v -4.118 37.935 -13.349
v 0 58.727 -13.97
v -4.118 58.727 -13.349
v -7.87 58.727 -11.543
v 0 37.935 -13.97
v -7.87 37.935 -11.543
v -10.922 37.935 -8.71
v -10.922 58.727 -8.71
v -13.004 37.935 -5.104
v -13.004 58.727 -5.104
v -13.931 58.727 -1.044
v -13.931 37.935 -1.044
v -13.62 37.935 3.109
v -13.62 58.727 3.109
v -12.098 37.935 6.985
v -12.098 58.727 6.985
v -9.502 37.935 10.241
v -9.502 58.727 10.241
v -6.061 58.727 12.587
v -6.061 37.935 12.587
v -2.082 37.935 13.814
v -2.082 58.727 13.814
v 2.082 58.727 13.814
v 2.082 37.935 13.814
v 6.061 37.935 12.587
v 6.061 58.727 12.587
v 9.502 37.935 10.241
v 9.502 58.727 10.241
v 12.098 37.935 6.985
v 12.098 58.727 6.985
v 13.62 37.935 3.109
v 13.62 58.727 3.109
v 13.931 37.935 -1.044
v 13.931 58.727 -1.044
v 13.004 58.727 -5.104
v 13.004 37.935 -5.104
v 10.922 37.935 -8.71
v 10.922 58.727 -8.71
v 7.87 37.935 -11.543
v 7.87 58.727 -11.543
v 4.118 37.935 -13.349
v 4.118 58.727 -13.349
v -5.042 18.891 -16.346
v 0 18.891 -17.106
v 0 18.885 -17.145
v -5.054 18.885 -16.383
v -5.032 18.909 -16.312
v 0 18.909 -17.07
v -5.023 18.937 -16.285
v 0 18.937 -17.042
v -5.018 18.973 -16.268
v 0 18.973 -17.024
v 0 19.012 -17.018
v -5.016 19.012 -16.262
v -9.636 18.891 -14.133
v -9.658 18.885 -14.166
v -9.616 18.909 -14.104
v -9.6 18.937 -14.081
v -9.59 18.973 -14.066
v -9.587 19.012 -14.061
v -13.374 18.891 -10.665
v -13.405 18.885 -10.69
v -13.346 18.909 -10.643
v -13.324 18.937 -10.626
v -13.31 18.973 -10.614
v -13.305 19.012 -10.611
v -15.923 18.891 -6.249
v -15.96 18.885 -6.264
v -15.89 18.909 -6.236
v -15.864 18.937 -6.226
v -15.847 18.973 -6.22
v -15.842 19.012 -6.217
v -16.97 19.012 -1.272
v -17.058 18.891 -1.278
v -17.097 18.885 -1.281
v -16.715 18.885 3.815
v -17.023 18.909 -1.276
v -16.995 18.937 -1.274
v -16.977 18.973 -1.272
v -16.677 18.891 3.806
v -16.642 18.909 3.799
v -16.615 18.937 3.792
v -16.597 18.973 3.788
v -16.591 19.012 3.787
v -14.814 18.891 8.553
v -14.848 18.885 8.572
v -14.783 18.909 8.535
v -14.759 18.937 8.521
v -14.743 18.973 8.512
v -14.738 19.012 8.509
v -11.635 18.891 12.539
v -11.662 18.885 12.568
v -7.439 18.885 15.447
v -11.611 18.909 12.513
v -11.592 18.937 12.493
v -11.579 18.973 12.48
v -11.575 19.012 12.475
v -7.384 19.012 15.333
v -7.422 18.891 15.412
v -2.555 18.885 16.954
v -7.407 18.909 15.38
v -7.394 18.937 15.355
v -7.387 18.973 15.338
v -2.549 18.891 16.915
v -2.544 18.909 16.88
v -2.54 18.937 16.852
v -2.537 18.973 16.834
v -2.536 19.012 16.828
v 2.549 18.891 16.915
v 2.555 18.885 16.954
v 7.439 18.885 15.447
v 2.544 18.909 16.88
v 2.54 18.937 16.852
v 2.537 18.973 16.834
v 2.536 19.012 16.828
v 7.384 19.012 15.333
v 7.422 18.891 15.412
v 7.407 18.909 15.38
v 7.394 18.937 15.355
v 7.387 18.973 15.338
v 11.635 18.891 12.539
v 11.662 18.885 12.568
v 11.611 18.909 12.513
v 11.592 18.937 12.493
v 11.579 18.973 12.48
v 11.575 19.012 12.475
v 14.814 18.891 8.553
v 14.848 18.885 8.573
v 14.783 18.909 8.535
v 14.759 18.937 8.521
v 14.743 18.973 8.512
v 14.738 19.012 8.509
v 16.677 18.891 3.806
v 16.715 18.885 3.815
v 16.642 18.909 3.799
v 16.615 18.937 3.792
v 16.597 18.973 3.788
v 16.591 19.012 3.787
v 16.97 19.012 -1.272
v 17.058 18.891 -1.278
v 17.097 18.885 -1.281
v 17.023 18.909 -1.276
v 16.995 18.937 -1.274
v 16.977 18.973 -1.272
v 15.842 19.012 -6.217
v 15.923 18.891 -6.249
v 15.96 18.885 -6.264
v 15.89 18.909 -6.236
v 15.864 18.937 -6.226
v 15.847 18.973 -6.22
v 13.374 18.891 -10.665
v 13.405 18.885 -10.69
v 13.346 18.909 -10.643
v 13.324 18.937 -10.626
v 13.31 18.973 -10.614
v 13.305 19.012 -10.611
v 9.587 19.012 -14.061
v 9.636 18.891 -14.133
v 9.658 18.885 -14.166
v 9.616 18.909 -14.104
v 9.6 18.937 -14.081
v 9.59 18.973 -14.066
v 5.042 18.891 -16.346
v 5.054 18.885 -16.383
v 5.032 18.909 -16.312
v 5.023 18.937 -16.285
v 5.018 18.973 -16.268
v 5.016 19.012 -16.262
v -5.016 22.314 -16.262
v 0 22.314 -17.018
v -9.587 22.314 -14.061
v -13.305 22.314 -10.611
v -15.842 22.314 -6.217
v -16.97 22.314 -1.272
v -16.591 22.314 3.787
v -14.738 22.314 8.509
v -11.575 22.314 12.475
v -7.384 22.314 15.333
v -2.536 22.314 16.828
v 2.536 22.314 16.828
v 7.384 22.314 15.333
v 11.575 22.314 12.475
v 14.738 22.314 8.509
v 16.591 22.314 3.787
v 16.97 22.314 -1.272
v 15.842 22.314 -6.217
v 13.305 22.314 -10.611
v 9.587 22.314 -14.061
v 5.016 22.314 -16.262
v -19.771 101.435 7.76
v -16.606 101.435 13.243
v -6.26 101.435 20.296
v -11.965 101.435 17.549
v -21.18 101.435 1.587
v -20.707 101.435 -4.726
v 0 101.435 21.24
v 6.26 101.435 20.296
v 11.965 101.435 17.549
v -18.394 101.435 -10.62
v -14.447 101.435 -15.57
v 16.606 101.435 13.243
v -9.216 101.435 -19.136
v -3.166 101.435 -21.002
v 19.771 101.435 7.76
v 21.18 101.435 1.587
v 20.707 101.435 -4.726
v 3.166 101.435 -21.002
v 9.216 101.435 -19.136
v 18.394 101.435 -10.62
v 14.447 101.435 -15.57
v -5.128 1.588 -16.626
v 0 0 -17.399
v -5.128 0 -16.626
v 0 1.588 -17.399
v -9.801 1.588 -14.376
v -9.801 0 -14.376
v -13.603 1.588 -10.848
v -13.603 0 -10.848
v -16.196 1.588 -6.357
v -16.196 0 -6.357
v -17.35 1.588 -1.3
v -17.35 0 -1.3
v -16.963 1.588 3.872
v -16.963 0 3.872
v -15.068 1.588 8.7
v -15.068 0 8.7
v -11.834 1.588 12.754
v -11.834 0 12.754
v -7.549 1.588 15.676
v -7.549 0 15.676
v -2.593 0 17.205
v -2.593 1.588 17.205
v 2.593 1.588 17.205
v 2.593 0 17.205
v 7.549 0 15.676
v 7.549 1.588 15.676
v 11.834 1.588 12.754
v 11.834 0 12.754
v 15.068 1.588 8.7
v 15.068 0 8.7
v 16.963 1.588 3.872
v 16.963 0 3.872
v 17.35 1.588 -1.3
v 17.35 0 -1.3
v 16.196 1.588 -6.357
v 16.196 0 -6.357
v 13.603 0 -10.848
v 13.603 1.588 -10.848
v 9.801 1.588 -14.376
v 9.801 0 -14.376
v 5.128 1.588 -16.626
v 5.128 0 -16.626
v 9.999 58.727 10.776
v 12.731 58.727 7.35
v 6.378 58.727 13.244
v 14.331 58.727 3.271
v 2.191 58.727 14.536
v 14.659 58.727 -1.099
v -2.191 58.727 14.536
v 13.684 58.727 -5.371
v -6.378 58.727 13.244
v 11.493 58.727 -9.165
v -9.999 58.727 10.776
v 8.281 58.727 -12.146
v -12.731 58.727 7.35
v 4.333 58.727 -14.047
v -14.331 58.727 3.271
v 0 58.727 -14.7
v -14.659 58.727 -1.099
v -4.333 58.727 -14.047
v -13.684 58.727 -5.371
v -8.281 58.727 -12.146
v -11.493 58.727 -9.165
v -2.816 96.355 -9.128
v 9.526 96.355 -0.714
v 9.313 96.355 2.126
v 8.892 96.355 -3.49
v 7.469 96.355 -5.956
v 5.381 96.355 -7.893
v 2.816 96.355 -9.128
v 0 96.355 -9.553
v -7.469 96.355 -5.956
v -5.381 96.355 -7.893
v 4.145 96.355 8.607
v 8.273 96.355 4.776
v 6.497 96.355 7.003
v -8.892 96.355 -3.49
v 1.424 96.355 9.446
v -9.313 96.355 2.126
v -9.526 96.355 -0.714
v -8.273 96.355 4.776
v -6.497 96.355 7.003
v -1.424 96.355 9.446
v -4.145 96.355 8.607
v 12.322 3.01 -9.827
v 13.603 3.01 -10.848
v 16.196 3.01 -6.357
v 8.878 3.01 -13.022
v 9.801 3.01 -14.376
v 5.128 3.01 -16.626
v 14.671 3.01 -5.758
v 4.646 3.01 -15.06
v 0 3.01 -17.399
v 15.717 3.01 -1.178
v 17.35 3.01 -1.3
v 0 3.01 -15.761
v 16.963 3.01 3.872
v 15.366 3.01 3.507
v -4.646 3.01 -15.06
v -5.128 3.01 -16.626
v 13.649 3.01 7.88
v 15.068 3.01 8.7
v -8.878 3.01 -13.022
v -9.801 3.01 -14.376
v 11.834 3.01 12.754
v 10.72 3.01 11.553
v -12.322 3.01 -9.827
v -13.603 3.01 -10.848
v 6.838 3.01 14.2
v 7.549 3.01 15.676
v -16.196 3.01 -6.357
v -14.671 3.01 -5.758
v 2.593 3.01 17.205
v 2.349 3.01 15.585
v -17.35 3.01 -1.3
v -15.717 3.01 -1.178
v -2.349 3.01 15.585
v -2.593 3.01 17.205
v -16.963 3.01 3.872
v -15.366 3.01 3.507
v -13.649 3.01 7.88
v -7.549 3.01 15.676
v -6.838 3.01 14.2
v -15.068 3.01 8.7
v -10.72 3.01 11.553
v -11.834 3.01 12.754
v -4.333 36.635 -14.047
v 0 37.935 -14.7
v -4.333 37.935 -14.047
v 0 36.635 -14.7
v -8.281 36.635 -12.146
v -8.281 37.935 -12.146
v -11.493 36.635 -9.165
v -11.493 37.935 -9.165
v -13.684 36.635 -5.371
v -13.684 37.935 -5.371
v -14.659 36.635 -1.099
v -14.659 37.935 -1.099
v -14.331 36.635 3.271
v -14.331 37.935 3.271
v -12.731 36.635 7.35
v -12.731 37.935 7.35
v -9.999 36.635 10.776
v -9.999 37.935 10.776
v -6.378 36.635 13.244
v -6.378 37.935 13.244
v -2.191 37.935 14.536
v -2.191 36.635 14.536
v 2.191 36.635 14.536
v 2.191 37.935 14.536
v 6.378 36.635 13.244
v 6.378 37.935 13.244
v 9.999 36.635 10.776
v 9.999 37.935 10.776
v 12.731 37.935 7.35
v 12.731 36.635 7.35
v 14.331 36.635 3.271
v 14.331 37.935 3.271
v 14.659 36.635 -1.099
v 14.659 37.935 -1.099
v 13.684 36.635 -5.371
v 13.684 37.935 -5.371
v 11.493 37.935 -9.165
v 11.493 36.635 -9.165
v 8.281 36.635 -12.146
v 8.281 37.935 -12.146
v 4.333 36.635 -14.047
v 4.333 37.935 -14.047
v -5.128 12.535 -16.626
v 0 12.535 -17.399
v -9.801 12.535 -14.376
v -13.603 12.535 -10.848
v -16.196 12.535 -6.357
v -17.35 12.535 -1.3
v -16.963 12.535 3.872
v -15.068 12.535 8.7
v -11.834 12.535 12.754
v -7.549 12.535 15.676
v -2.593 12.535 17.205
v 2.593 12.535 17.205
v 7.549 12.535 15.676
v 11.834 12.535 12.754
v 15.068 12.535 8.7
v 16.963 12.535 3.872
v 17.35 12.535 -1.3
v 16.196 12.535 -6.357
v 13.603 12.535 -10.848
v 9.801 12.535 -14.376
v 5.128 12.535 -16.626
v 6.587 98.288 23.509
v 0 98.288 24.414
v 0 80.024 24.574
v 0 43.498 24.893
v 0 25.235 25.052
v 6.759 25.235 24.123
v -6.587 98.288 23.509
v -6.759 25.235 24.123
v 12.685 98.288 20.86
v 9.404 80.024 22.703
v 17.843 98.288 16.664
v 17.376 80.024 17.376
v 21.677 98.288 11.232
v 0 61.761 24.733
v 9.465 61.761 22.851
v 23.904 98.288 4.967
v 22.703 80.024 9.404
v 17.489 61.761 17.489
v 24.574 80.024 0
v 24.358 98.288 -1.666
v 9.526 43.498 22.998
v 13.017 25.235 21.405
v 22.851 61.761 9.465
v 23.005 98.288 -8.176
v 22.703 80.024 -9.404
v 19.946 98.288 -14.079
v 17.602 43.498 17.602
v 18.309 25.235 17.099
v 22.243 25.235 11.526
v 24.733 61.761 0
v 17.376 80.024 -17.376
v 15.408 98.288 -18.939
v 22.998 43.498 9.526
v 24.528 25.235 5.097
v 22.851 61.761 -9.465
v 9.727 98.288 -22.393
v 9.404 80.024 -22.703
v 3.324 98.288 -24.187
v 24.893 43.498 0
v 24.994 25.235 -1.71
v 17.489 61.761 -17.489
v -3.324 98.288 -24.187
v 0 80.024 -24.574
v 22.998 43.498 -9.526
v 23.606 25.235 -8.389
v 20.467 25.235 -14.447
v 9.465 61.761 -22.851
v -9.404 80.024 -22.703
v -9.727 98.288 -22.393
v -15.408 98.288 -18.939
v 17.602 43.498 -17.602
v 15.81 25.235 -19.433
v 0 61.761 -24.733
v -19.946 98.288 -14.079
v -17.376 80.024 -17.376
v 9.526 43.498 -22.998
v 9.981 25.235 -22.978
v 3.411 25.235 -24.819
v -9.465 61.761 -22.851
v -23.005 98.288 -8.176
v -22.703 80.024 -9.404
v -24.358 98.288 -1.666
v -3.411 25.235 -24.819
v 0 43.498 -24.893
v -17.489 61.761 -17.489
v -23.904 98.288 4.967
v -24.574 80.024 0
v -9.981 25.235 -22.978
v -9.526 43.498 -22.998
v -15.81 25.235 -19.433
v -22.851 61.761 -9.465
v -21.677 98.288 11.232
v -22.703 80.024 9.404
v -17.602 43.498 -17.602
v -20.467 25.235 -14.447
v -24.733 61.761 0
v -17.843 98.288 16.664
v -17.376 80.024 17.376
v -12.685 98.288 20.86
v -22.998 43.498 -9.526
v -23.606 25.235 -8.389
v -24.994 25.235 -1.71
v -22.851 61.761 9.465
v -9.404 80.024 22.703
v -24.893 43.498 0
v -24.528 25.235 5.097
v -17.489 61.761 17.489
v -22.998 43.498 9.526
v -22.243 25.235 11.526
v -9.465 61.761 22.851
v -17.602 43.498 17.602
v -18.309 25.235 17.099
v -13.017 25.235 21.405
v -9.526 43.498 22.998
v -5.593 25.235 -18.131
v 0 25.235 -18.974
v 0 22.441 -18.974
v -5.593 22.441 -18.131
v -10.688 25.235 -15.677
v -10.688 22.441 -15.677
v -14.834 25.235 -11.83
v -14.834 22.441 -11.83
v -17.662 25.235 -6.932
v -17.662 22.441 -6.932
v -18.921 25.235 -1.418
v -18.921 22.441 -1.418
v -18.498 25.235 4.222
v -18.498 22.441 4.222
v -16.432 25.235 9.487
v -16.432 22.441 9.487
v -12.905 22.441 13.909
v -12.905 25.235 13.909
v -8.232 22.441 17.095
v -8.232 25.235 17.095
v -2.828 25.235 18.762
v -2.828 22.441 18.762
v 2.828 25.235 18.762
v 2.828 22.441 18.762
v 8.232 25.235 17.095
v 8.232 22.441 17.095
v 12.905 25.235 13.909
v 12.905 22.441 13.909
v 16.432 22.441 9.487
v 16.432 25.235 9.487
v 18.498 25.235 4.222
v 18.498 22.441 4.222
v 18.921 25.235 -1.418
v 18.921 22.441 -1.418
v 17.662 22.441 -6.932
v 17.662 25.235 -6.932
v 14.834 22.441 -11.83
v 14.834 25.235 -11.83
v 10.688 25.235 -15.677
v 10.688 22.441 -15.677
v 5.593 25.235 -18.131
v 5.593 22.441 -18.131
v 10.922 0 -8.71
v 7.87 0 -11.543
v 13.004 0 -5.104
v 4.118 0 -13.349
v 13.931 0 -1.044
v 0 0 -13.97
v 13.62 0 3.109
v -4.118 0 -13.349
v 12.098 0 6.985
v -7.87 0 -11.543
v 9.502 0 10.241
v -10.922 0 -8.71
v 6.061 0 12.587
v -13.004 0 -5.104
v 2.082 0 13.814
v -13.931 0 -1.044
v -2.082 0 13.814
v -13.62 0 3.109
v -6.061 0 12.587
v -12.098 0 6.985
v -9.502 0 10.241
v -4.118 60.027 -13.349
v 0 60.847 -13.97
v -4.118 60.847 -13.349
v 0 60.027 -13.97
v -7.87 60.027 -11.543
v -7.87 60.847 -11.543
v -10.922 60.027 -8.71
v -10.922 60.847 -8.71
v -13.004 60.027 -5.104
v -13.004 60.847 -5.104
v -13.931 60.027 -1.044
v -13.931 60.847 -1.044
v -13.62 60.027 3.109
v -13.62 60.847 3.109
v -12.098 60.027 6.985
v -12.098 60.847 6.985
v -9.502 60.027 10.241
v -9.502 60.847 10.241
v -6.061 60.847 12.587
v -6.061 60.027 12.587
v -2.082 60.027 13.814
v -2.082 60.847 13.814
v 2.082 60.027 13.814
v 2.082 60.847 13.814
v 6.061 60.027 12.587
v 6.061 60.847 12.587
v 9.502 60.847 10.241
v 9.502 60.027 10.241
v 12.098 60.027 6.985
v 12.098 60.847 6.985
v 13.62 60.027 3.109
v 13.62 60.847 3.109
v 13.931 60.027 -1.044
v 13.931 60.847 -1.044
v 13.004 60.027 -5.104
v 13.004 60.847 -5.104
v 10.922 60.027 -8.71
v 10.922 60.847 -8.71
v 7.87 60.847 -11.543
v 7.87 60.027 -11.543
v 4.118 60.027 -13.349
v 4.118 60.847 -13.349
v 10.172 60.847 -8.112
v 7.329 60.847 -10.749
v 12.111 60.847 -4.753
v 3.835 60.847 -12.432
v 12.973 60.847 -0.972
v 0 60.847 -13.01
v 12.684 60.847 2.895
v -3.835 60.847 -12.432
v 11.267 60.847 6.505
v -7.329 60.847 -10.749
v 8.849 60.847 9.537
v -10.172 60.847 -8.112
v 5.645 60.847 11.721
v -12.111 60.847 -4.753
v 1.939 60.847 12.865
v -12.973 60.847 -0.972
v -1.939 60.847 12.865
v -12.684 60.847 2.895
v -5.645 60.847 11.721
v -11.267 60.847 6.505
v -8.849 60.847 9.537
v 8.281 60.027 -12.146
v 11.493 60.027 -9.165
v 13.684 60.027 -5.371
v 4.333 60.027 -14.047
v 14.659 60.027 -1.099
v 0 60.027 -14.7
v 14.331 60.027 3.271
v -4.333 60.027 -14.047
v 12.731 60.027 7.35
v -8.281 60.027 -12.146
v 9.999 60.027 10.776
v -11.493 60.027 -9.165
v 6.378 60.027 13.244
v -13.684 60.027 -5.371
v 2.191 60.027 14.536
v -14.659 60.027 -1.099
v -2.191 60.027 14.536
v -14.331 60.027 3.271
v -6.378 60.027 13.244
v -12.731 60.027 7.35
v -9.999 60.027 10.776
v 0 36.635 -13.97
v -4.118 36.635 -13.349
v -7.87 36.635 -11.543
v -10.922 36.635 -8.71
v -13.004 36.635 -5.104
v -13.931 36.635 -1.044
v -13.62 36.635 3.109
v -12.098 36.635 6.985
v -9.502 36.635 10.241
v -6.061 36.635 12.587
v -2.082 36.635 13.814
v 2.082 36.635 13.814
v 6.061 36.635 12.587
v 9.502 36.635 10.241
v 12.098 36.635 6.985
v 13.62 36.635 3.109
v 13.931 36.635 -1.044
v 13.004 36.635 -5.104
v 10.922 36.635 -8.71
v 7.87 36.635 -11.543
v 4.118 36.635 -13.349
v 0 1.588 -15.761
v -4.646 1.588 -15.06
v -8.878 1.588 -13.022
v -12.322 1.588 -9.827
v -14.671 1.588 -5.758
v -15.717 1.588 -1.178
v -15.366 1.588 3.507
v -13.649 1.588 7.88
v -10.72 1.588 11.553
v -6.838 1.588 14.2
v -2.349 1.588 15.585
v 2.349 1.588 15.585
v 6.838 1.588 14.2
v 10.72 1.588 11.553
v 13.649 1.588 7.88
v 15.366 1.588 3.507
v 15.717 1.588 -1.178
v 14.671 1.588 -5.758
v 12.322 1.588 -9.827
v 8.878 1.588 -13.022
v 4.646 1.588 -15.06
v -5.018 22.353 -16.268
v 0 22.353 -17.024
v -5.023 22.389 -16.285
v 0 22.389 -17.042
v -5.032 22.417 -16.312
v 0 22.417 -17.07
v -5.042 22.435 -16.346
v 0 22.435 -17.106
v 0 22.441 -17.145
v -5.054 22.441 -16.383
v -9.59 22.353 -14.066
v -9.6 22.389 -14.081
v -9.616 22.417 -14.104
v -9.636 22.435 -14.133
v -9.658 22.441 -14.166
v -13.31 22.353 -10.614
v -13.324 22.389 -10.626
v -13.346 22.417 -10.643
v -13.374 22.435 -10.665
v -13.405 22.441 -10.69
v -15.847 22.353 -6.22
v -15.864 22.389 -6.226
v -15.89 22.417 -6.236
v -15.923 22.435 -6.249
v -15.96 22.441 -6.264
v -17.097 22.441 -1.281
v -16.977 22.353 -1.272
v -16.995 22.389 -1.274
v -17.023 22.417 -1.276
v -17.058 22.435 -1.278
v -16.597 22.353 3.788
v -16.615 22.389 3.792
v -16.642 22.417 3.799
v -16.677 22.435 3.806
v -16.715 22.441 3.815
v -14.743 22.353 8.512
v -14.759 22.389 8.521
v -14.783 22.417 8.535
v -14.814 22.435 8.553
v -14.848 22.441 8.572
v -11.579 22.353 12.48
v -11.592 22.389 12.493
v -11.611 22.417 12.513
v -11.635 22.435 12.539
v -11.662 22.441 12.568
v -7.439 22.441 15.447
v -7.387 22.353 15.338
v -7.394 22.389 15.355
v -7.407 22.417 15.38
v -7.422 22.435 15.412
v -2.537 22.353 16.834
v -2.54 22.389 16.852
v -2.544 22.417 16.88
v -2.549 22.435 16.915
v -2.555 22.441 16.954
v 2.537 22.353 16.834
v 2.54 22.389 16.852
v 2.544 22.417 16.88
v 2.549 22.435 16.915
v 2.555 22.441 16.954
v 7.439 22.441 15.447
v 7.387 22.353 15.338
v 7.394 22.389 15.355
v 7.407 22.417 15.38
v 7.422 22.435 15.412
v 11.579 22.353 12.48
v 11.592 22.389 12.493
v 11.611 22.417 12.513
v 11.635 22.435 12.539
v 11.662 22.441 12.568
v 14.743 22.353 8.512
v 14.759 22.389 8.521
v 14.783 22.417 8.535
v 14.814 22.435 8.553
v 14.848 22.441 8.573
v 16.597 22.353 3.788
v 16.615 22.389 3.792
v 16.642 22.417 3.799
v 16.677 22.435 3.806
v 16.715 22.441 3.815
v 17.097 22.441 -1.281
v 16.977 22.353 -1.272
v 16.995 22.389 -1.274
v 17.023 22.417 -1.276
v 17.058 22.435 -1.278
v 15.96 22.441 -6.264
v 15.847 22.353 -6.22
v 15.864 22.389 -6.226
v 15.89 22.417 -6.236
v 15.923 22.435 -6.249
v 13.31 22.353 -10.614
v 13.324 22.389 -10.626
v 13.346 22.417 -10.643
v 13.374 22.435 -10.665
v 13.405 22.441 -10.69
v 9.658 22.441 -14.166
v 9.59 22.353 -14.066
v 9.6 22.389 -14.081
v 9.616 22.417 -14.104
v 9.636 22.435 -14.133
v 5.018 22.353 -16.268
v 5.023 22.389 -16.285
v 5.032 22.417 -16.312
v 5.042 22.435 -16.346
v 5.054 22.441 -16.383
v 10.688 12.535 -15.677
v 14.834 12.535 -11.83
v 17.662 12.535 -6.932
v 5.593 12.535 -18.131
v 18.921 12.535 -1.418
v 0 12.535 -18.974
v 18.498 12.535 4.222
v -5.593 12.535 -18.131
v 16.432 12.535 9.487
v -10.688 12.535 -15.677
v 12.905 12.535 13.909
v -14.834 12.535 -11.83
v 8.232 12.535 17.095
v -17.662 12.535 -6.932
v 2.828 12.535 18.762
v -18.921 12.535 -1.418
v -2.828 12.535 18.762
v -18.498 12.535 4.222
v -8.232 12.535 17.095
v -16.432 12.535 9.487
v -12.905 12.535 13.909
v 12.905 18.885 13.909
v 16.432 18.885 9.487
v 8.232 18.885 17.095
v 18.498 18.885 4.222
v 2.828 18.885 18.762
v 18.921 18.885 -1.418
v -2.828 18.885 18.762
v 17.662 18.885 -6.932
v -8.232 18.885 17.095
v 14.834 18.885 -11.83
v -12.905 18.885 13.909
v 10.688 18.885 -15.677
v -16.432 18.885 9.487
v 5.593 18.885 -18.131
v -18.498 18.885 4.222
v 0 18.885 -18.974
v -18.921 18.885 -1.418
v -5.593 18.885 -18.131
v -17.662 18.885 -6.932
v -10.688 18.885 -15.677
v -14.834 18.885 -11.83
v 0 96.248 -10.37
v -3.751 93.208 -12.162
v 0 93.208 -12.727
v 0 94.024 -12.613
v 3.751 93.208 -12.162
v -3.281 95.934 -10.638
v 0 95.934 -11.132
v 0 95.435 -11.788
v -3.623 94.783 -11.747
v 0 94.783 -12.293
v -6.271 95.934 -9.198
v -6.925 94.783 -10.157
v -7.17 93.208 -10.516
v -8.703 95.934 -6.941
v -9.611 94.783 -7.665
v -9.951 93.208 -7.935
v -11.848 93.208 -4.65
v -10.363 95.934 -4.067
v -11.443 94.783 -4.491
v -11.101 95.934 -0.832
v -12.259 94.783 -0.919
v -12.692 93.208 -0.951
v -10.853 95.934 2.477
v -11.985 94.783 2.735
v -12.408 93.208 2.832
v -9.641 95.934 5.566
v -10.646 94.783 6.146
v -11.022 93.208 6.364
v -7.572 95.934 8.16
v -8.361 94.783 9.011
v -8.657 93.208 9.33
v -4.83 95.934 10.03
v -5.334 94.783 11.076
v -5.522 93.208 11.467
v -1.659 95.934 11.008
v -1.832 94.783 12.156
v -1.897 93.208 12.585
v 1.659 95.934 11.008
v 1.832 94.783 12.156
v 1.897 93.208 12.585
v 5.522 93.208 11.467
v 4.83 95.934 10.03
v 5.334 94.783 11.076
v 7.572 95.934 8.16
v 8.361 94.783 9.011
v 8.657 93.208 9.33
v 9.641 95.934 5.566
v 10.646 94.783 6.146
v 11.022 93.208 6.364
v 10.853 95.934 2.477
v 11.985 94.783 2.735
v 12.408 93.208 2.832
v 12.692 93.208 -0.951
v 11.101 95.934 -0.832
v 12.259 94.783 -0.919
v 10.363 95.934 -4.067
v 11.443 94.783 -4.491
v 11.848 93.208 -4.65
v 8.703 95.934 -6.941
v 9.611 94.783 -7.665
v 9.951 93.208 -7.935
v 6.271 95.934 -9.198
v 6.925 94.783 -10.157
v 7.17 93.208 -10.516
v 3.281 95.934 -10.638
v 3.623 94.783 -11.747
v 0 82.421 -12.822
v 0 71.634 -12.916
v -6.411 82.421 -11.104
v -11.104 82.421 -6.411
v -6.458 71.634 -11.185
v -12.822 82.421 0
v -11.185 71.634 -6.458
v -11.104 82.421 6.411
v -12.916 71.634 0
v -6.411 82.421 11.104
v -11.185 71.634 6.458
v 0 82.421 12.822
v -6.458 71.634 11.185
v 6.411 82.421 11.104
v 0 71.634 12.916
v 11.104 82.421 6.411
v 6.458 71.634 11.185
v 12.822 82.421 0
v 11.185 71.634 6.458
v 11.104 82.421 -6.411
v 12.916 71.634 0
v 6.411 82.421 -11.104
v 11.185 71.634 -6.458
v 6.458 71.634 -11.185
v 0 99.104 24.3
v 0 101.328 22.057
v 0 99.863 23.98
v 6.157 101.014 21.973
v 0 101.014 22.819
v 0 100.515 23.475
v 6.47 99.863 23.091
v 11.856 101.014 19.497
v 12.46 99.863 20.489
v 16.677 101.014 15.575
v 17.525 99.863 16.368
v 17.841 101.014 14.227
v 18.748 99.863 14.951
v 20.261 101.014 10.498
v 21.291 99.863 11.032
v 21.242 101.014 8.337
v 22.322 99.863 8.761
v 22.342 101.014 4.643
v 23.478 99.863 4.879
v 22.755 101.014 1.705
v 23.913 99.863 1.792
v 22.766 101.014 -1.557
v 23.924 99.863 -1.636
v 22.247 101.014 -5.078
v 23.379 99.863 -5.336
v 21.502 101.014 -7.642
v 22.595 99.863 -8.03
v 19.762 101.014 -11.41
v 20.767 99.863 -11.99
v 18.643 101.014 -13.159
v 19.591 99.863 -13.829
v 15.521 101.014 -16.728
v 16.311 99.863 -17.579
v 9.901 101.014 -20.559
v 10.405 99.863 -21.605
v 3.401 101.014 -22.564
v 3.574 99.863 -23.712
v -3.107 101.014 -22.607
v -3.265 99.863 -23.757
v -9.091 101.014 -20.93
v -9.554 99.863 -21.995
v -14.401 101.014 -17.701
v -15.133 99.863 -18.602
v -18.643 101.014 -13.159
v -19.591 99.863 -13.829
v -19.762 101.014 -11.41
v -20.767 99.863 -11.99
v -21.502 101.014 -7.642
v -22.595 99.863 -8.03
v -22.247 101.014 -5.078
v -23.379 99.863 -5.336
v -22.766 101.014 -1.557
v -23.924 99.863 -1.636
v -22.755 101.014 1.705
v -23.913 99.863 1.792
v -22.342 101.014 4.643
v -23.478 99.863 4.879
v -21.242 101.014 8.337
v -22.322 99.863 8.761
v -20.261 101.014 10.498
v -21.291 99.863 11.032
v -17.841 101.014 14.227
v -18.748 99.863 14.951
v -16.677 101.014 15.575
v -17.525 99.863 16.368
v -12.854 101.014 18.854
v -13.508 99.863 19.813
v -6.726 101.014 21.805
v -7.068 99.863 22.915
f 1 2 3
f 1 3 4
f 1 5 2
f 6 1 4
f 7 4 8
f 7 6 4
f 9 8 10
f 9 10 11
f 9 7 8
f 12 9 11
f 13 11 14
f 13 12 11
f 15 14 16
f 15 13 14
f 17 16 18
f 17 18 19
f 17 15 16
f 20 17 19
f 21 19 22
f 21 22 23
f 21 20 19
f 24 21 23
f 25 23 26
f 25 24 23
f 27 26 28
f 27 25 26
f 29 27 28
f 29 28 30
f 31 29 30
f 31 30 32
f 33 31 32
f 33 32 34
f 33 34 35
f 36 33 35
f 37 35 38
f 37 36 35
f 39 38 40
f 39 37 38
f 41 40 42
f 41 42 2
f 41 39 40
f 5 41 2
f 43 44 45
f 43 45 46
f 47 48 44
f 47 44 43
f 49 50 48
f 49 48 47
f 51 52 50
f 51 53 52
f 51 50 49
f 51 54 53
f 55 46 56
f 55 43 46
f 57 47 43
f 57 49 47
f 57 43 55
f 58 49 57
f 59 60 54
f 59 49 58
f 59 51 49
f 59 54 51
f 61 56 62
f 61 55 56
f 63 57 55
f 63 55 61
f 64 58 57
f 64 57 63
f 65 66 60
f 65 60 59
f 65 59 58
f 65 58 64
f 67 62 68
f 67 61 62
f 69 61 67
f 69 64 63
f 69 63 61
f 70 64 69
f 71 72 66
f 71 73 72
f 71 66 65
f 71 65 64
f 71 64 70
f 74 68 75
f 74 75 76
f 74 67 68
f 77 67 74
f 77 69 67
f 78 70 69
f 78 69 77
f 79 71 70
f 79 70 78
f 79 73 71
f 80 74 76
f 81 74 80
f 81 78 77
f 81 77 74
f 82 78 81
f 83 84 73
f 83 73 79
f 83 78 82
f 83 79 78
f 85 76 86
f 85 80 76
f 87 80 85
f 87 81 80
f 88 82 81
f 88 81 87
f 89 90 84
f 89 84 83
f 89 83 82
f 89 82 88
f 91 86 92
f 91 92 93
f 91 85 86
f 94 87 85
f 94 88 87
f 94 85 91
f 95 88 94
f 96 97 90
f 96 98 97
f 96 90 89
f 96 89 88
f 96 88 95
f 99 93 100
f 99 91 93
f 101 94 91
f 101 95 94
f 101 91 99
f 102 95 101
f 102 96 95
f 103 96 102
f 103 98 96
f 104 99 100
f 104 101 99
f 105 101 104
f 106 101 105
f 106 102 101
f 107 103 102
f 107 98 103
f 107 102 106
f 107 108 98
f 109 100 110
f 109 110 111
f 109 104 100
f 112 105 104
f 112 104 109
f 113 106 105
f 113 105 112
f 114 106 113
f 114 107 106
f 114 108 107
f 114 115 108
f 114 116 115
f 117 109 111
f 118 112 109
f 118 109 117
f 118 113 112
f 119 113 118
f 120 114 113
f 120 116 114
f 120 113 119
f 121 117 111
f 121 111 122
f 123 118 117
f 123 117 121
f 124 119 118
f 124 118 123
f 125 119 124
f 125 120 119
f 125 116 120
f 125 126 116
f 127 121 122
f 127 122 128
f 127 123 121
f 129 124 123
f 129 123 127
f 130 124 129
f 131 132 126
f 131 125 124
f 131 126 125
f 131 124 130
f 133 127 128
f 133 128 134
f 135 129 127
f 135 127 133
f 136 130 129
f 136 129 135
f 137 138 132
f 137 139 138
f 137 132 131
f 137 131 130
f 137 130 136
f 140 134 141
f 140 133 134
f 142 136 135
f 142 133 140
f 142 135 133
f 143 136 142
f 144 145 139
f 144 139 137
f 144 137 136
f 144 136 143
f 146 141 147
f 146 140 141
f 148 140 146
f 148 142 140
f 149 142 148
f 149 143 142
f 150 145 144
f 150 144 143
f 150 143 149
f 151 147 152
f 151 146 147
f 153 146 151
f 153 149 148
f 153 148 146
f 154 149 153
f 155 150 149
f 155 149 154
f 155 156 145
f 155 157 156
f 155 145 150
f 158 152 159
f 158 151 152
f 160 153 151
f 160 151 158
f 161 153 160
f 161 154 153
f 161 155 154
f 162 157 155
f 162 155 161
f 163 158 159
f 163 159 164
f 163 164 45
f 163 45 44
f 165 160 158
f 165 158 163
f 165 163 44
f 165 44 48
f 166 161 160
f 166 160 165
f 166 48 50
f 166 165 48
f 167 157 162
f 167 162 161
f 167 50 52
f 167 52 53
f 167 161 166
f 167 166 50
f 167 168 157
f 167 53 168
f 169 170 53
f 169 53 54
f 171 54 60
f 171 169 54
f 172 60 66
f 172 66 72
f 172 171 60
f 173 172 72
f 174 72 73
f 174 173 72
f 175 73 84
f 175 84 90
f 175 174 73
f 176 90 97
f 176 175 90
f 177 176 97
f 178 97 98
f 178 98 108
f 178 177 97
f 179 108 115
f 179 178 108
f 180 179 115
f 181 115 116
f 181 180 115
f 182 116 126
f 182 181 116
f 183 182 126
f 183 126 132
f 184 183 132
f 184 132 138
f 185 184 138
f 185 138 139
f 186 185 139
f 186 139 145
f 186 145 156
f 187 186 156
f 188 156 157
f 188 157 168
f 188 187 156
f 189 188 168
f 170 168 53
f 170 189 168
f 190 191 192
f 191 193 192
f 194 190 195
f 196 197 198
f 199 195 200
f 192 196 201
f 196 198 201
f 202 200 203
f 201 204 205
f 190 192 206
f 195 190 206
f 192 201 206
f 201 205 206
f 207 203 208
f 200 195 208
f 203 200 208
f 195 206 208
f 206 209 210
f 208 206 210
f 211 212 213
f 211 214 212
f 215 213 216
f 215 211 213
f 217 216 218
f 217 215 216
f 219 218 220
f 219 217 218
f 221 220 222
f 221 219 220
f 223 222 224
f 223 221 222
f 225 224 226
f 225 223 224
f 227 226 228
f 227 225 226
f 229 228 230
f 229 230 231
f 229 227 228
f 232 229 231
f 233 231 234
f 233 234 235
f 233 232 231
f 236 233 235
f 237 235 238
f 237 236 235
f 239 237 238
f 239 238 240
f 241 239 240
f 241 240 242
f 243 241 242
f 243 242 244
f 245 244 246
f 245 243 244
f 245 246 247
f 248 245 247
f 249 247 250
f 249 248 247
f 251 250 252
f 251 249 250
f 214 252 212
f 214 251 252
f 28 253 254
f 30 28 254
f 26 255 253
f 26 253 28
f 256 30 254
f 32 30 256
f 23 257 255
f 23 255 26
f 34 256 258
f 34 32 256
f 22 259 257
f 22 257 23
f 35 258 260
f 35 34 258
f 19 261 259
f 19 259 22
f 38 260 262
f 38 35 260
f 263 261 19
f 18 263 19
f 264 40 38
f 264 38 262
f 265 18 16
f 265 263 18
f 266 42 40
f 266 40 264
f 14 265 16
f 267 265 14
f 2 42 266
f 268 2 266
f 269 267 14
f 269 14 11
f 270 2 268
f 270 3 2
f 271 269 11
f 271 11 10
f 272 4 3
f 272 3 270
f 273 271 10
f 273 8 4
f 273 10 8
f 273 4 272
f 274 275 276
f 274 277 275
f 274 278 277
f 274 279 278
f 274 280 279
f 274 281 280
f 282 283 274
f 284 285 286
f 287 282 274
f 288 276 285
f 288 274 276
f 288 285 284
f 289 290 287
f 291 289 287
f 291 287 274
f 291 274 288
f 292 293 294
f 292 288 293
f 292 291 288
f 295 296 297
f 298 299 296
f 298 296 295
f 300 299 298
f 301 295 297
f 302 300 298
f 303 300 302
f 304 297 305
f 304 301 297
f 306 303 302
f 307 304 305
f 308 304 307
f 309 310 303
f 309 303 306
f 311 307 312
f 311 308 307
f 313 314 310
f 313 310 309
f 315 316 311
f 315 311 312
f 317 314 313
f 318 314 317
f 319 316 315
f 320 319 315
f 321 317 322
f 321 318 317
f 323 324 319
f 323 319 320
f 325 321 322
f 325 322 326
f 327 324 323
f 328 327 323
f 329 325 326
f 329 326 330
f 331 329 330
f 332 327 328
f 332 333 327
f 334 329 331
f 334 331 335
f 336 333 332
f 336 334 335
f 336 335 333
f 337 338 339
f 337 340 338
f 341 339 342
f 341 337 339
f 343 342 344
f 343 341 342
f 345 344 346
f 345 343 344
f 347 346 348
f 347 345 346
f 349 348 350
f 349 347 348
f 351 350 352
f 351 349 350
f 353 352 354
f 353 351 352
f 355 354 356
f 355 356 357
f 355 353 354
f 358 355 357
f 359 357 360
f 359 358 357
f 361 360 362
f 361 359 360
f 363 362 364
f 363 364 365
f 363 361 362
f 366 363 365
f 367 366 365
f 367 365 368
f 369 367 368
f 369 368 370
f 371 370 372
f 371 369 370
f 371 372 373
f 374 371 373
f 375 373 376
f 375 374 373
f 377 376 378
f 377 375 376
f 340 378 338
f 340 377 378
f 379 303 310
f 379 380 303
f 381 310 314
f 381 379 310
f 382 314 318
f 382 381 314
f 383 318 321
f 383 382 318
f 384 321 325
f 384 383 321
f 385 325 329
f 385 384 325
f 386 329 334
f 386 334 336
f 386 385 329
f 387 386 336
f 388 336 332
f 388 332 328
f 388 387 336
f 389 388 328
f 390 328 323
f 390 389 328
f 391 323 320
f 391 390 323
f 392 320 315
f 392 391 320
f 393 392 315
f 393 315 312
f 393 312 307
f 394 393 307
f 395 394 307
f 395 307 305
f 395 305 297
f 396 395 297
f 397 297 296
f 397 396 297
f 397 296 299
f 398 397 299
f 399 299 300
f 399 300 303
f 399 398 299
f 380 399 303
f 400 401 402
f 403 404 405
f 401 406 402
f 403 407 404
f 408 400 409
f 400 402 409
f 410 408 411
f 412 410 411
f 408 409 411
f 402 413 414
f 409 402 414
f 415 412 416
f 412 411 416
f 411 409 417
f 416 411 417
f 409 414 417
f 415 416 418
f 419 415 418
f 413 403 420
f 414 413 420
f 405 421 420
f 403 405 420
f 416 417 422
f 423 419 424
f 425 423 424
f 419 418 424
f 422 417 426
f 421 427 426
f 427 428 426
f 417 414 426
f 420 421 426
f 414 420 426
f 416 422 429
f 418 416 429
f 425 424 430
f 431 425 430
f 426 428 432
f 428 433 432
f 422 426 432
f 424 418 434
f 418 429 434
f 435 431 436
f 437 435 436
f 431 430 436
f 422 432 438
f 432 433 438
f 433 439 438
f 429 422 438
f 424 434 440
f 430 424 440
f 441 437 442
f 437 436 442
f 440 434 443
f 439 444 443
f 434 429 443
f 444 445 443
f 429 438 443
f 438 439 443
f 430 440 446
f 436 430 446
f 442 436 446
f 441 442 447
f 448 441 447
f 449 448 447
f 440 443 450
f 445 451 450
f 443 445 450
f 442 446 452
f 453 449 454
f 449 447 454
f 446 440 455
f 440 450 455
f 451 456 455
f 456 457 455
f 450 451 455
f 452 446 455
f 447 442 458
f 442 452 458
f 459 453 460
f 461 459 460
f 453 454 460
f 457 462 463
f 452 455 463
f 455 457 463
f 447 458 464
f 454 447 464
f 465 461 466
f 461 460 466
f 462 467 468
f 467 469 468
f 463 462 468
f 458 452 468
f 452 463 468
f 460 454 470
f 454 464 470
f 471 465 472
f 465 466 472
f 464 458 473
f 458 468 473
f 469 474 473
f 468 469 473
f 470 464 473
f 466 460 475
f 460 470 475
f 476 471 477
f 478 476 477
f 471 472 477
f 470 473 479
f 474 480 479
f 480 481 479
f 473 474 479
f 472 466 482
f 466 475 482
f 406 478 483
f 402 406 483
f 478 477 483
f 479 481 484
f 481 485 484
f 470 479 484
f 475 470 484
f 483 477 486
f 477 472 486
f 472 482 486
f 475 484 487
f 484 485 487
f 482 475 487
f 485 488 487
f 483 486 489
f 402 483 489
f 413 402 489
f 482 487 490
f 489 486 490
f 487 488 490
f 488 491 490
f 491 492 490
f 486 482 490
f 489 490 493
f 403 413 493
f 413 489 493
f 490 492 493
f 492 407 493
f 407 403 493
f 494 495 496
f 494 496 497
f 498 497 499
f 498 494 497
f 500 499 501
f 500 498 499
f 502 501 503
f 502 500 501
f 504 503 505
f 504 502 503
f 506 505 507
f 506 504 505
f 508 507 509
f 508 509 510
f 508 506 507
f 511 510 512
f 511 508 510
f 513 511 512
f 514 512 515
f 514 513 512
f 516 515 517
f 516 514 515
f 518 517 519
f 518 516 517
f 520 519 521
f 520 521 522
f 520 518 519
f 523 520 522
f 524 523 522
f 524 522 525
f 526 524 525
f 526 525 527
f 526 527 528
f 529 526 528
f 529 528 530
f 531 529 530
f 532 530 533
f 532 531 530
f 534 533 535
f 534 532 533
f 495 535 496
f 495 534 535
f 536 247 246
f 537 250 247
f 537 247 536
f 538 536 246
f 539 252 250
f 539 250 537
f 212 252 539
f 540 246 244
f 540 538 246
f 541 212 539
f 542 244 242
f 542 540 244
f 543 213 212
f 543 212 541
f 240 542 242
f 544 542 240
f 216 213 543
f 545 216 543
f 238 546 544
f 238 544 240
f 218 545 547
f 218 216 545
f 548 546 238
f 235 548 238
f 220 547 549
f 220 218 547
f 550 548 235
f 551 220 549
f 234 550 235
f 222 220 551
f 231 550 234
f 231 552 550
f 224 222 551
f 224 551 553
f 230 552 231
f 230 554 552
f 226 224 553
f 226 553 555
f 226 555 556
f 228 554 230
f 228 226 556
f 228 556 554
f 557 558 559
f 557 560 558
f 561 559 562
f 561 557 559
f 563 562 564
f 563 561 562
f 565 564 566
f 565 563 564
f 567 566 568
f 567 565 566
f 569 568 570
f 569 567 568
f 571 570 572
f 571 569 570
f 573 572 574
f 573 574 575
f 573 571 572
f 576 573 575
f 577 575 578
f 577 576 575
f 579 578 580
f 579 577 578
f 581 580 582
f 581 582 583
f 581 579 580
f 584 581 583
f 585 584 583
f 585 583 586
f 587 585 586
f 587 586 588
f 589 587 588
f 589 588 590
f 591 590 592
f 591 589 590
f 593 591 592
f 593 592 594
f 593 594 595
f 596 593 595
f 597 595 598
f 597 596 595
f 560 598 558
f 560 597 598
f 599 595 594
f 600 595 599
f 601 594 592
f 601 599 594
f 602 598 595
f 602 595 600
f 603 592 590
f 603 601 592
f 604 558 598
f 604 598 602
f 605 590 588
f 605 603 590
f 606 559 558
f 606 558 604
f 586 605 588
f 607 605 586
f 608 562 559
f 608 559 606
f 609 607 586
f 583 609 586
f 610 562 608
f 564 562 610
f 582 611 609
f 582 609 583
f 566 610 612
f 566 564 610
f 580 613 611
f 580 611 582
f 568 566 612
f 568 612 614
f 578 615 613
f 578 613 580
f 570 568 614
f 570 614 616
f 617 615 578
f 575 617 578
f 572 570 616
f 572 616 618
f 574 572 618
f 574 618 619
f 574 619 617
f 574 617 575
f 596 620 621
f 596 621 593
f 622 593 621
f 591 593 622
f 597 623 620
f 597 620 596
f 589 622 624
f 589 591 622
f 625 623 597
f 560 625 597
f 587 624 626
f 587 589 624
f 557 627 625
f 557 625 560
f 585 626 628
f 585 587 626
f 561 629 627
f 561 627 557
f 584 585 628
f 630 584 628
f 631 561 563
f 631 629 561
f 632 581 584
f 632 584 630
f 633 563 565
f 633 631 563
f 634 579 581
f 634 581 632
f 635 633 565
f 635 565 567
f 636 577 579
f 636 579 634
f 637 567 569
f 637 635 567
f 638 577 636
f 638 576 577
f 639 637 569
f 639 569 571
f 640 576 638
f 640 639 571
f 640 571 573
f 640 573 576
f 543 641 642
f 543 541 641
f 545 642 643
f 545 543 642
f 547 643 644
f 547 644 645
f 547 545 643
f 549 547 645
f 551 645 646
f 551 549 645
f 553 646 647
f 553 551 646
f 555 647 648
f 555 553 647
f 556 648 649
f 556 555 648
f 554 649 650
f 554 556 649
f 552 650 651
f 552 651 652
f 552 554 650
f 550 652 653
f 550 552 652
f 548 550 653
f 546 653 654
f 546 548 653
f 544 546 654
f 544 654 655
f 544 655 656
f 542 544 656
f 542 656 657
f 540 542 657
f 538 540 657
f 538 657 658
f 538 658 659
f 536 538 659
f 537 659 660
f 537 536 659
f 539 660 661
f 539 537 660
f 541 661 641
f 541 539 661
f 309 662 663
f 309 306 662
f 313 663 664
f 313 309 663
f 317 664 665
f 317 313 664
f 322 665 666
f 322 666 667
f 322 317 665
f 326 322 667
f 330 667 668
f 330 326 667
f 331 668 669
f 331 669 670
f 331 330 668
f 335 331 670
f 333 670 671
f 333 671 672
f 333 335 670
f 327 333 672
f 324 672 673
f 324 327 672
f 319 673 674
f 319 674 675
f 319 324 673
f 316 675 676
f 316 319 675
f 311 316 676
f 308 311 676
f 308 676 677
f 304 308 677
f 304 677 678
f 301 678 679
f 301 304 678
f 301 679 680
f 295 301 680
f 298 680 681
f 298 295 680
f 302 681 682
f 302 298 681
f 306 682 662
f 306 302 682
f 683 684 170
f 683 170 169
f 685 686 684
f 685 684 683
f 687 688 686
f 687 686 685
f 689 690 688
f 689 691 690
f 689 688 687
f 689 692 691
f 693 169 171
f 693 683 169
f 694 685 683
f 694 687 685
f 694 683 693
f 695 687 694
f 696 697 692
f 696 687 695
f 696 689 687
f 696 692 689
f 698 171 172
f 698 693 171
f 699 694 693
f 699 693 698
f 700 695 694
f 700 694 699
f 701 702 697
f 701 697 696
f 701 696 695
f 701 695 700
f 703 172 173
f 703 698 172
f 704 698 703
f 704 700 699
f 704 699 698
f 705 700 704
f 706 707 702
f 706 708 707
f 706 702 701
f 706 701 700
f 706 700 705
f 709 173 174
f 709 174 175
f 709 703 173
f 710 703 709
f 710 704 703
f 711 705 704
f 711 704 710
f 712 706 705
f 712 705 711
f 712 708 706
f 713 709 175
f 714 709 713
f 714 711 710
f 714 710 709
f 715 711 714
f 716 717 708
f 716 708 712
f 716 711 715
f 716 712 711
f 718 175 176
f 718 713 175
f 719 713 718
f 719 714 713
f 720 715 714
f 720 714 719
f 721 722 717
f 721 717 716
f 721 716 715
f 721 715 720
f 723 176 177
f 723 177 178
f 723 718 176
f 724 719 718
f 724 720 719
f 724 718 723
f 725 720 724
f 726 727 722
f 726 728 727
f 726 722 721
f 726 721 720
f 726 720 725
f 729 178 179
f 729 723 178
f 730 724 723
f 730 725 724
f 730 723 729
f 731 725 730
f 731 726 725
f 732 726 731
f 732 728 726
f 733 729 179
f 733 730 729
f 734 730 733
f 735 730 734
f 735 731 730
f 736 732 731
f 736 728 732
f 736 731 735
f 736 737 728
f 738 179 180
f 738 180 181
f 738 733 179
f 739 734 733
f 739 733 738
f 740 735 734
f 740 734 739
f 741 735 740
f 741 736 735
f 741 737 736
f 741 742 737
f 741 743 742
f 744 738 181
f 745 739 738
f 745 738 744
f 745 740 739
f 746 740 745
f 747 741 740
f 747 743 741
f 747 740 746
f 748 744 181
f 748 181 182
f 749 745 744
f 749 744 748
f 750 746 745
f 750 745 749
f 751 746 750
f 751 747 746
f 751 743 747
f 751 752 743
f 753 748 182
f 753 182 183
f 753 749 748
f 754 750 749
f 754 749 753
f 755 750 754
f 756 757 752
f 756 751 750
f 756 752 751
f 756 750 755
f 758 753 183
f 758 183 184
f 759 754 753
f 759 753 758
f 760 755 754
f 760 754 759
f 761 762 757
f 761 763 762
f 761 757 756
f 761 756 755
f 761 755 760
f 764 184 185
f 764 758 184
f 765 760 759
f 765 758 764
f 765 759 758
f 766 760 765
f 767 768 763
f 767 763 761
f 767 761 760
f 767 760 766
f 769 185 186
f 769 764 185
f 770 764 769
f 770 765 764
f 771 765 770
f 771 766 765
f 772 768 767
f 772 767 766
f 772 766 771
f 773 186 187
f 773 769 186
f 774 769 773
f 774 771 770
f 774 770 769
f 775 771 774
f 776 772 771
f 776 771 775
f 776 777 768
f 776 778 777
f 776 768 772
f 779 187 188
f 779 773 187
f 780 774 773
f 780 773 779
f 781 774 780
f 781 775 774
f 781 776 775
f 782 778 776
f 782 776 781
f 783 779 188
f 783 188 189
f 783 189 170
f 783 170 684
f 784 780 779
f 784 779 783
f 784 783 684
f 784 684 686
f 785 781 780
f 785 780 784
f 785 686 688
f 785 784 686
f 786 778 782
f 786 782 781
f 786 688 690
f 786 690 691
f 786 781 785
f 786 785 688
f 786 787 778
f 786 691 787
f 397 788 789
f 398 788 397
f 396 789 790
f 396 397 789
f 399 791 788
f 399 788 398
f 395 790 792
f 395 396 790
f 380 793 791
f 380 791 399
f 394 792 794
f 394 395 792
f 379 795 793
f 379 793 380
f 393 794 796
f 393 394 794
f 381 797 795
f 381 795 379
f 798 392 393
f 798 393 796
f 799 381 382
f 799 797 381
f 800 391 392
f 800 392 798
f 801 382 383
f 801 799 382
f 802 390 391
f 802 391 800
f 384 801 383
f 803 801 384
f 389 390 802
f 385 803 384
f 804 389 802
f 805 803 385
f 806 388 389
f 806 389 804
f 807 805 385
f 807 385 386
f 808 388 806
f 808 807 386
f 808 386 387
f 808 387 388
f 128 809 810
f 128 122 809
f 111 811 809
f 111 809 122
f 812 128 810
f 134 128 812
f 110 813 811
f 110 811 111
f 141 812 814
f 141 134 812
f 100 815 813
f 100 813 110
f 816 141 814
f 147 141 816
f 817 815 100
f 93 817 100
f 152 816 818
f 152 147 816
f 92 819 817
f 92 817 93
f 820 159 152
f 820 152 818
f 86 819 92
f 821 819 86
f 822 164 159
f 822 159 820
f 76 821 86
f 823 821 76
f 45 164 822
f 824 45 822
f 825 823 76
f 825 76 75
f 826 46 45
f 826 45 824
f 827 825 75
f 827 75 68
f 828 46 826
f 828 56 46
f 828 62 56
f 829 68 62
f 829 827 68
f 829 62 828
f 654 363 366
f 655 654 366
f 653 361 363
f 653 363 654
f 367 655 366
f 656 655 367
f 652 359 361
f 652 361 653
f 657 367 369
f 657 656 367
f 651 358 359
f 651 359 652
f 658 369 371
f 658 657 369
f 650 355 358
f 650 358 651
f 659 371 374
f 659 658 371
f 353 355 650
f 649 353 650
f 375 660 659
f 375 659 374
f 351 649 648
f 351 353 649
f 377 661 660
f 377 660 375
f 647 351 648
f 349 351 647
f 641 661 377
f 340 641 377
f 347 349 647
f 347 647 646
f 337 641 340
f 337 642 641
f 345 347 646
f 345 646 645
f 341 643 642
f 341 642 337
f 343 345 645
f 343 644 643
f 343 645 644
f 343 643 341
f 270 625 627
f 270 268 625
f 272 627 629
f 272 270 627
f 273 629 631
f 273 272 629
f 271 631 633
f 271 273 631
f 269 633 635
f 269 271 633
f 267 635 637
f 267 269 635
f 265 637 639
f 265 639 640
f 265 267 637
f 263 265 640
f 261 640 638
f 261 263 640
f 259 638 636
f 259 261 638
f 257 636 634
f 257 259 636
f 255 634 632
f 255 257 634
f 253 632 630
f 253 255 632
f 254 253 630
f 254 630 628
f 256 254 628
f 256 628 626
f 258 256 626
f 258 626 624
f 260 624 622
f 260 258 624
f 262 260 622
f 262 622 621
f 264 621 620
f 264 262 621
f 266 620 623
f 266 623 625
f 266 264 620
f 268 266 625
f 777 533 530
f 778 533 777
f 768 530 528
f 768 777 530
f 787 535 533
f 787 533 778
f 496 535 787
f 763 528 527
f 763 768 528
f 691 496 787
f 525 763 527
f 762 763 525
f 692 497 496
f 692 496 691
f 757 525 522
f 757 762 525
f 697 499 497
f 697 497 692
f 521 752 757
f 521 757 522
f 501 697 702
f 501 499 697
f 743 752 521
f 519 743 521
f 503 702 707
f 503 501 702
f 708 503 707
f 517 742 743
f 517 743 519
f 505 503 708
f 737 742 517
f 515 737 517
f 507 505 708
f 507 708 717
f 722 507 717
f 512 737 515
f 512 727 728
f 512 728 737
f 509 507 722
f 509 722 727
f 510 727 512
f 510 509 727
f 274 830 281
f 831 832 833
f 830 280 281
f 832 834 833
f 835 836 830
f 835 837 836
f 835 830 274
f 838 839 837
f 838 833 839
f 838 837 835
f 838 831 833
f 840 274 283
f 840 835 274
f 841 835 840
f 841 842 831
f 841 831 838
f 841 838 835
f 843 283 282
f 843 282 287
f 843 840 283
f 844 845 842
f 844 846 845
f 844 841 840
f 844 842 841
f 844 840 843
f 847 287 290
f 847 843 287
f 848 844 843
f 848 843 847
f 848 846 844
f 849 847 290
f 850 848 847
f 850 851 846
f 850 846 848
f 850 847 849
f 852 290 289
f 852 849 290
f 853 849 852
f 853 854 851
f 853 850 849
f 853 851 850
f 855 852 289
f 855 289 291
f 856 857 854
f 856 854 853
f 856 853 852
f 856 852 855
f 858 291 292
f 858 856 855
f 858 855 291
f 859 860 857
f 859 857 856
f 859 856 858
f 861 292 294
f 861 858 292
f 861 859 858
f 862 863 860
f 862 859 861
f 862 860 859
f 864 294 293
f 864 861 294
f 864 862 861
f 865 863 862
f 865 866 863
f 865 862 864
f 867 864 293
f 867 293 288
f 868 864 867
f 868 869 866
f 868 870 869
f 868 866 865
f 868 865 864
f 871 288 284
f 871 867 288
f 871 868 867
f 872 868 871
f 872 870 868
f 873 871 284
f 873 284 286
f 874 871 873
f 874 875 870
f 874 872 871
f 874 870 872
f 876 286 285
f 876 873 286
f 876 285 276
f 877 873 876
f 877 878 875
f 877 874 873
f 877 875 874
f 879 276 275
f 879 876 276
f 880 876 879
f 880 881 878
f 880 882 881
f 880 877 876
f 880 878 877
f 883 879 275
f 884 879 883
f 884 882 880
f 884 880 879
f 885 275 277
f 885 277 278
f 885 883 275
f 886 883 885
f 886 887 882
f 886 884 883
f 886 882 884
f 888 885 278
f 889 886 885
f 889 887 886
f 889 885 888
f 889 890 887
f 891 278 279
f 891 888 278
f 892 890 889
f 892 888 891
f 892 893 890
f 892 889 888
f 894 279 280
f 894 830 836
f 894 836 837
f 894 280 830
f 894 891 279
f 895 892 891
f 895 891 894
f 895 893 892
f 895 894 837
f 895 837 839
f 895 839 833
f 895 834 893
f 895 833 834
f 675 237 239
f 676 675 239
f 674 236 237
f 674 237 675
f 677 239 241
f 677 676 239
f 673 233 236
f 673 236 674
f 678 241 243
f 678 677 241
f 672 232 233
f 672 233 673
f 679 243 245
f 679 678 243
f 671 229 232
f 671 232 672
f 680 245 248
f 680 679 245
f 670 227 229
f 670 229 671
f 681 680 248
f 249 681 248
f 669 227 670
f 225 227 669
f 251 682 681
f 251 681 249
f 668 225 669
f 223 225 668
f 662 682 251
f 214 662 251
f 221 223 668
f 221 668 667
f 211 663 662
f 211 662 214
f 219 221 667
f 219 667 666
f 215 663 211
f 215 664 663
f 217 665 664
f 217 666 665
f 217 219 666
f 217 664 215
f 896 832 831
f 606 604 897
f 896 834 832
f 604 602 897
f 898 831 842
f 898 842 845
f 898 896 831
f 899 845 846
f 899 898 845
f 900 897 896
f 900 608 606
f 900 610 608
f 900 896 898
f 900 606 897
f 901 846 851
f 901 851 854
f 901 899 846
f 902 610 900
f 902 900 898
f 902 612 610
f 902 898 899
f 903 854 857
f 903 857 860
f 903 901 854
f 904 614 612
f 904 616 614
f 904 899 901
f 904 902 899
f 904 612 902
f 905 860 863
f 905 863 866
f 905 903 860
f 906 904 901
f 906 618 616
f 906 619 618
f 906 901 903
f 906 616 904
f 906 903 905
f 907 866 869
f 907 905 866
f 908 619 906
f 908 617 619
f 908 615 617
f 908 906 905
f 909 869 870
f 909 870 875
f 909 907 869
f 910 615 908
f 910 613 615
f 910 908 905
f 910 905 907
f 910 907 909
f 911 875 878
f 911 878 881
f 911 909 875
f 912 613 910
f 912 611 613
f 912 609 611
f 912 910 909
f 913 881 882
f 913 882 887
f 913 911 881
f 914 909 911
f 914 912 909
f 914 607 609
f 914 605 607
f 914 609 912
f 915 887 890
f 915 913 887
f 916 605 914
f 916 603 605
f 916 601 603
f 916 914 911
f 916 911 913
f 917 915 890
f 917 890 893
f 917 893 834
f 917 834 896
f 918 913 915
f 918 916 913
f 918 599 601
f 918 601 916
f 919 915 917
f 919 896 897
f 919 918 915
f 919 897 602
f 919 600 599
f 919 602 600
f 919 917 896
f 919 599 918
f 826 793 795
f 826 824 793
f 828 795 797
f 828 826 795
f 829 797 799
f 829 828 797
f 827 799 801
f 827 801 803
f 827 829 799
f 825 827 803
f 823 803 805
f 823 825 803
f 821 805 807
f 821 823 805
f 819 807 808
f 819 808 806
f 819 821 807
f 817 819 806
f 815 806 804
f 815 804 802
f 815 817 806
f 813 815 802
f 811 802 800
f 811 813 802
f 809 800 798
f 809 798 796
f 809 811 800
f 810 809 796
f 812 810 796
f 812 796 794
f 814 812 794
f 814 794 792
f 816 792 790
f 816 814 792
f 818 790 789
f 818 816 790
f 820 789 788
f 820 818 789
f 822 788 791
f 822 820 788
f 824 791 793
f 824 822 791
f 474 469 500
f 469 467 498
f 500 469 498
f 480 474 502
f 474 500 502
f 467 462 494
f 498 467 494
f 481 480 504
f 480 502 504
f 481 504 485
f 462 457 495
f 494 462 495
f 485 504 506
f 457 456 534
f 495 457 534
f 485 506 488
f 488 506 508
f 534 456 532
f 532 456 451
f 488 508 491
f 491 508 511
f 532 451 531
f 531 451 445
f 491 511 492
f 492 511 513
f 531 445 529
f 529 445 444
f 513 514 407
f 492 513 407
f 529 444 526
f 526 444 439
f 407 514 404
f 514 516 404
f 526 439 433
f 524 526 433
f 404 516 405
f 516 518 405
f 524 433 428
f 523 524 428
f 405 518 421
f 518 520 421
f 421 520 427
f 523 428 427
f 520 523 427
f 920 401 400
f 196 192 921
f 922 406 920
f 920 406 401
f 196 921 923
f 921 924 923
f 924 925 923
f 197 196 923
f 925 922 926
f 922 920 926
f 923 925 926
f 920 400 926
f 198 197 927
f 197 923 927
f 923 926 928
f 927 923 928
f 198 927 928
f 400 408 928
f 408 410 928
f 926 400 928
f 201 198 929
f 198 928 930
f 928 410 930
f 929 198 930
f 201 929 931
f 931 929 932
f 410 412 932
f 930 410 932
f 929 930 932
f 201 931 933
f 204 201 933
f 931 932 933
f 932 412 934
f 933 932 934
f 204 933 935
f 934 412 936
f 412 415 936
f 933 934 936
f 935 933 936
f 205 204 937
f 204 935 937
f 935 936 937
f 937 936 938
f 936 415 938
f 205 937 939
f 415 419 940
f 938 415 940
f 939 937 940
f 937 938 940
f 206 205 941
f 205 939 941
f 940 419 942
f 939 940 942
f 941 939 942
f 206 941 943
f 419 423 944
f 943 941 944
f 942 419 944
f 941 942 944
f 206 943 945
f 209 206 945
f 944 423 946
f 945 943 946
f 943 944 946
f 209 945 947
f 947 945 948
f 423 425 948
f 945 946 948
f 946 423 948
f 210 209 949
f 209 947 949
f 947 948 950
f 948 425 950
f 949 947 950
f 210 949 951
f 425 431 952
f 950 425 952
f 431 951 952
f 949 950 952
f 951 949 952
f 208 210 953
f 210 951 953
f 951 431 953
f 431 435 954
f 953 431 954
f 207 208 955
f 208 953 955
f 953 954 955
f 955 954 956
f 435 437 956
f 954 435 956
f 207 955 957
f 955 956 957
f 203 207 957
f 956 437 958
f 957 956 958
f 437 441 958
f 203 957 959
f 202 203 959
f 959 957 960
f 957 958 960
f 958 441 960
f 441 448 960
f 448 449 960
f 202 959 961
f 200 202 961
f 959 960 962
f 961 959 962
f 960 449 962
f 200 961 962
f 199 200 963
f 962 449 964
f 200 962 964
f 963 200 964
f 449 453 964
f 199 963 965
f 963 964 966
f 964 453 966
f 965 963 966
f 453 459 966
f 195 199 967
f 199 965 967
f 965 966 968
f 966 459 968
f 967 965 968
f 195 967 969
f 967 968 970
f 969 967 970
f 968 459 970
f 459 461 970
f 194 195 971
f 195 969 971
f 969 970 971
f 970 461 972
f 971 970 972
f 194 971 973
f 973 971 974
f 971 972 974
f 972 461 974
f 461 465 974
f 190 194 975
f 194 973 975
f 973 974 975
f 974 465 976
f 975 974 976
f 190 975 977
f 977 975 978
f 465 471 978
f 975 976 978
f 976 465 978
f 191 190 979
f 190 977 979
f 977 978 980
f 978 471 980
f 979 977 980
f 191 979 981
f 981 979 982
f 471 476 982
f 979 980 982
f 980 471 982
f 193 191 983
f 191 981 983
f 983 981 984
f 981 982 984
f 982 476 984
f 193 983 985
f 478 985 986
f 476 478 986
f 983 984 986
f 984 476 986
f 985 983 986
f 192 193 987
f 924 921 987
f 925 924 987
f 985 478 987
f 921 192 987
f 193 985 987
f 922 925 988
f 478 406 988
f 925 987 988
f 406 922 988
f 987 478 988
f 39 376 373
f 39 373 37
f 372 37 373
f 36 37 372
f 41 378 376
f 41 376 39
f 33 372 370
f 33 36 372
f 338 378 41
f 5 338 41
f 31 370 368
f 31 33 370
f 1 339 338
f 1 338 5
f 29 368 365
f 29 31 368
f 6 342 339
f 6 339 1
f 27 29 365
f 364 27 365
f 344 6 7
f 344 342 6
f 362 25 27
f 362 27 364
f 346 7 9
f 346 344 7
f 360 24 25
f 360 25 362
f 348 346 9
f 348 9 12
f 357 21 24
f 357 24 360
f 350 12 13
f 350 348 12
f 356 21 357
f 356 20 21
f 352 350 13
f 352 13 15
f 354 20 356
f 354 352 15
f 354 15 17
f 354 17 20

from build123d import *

# Parameters (mm, degrees)
FILLET2_R        = 3.175
FILLET4_R        = 0.127
HC843E_FILLET3_R = 3.175


with BuildPart() as part:
    # Sketch1 → Revolve1 (revolve)
    with BuildSketch(Plane.XY):
        Polygon((-13.97, 0), (-17.399, 0), (-17.399, 1.5875), (-15.7607, 1.5875), (-15.7607, 3.0099), (-17.399, 3.0099), (-17.399, 12.5349), (-18.9738, 12.5349), (-18.9738, 18.8849), (-17.018, 18.8849), (-17.018, 22.4409), (-18.9738, 22.4409), (-18.9738, 25.2349), (-18.308812674, 101.4349), (0, 101.4349), (0, 96.3549), (-12.7, 96.3549), (-13.009873622, 60.8469), (-13.97, 60.8469), (-13.97, 60.0269), (-14.7, 60.0269), (-14.7, 58.7269026), (-13.97, 58.7269026), (-13.97, 37.9349), (-14.7, 37.9349), (-14.7, 36.6349026), (-13.97, 36.6349026), align=None)
    revolve(axis=Axis((0, 0, 0), (0, 1, 0)))

    # Fillet2
    fillet2_edges = [part.edges().sort_by_distance(p)[0] for p in [
        (12.7, 96.3549, 0),
    ]]
    fillet(fillet2_edges, radius=FILLET2_R)

    # Fillet4
    fillet4_edges = [part.edges().sort_by_distance(p)[0] for p in [
        (17.018, 18.8849, 0),
        (17.018, 22.4409, 0),
    ]]
    fillet(fillet4_edges, radius=FILLET4_R)

    # Sketch4 → HC843E Revolve3 (revolve)
    with BuildSketch(Plane.XY):
        Polygon((-18.308812674, 101.4349), (-24.387019881, 101.4349), (-25.052007206, 25.2349), (-18.9738, 25.2349), align=None)
    revolve(axis=Axis((0, 0, 0), (0, 1, 0)))

    # HC843E Fillet3
    hc843e_fillet3_edges = [part.edges().sort_by_distance(p)[0] for p in [
        (24.387019881, 101.4349, 0),
    ]]
    fillet(hc843e_fillet3_edges, radius=HC843E_FILLET3_R)


solid = part.part
